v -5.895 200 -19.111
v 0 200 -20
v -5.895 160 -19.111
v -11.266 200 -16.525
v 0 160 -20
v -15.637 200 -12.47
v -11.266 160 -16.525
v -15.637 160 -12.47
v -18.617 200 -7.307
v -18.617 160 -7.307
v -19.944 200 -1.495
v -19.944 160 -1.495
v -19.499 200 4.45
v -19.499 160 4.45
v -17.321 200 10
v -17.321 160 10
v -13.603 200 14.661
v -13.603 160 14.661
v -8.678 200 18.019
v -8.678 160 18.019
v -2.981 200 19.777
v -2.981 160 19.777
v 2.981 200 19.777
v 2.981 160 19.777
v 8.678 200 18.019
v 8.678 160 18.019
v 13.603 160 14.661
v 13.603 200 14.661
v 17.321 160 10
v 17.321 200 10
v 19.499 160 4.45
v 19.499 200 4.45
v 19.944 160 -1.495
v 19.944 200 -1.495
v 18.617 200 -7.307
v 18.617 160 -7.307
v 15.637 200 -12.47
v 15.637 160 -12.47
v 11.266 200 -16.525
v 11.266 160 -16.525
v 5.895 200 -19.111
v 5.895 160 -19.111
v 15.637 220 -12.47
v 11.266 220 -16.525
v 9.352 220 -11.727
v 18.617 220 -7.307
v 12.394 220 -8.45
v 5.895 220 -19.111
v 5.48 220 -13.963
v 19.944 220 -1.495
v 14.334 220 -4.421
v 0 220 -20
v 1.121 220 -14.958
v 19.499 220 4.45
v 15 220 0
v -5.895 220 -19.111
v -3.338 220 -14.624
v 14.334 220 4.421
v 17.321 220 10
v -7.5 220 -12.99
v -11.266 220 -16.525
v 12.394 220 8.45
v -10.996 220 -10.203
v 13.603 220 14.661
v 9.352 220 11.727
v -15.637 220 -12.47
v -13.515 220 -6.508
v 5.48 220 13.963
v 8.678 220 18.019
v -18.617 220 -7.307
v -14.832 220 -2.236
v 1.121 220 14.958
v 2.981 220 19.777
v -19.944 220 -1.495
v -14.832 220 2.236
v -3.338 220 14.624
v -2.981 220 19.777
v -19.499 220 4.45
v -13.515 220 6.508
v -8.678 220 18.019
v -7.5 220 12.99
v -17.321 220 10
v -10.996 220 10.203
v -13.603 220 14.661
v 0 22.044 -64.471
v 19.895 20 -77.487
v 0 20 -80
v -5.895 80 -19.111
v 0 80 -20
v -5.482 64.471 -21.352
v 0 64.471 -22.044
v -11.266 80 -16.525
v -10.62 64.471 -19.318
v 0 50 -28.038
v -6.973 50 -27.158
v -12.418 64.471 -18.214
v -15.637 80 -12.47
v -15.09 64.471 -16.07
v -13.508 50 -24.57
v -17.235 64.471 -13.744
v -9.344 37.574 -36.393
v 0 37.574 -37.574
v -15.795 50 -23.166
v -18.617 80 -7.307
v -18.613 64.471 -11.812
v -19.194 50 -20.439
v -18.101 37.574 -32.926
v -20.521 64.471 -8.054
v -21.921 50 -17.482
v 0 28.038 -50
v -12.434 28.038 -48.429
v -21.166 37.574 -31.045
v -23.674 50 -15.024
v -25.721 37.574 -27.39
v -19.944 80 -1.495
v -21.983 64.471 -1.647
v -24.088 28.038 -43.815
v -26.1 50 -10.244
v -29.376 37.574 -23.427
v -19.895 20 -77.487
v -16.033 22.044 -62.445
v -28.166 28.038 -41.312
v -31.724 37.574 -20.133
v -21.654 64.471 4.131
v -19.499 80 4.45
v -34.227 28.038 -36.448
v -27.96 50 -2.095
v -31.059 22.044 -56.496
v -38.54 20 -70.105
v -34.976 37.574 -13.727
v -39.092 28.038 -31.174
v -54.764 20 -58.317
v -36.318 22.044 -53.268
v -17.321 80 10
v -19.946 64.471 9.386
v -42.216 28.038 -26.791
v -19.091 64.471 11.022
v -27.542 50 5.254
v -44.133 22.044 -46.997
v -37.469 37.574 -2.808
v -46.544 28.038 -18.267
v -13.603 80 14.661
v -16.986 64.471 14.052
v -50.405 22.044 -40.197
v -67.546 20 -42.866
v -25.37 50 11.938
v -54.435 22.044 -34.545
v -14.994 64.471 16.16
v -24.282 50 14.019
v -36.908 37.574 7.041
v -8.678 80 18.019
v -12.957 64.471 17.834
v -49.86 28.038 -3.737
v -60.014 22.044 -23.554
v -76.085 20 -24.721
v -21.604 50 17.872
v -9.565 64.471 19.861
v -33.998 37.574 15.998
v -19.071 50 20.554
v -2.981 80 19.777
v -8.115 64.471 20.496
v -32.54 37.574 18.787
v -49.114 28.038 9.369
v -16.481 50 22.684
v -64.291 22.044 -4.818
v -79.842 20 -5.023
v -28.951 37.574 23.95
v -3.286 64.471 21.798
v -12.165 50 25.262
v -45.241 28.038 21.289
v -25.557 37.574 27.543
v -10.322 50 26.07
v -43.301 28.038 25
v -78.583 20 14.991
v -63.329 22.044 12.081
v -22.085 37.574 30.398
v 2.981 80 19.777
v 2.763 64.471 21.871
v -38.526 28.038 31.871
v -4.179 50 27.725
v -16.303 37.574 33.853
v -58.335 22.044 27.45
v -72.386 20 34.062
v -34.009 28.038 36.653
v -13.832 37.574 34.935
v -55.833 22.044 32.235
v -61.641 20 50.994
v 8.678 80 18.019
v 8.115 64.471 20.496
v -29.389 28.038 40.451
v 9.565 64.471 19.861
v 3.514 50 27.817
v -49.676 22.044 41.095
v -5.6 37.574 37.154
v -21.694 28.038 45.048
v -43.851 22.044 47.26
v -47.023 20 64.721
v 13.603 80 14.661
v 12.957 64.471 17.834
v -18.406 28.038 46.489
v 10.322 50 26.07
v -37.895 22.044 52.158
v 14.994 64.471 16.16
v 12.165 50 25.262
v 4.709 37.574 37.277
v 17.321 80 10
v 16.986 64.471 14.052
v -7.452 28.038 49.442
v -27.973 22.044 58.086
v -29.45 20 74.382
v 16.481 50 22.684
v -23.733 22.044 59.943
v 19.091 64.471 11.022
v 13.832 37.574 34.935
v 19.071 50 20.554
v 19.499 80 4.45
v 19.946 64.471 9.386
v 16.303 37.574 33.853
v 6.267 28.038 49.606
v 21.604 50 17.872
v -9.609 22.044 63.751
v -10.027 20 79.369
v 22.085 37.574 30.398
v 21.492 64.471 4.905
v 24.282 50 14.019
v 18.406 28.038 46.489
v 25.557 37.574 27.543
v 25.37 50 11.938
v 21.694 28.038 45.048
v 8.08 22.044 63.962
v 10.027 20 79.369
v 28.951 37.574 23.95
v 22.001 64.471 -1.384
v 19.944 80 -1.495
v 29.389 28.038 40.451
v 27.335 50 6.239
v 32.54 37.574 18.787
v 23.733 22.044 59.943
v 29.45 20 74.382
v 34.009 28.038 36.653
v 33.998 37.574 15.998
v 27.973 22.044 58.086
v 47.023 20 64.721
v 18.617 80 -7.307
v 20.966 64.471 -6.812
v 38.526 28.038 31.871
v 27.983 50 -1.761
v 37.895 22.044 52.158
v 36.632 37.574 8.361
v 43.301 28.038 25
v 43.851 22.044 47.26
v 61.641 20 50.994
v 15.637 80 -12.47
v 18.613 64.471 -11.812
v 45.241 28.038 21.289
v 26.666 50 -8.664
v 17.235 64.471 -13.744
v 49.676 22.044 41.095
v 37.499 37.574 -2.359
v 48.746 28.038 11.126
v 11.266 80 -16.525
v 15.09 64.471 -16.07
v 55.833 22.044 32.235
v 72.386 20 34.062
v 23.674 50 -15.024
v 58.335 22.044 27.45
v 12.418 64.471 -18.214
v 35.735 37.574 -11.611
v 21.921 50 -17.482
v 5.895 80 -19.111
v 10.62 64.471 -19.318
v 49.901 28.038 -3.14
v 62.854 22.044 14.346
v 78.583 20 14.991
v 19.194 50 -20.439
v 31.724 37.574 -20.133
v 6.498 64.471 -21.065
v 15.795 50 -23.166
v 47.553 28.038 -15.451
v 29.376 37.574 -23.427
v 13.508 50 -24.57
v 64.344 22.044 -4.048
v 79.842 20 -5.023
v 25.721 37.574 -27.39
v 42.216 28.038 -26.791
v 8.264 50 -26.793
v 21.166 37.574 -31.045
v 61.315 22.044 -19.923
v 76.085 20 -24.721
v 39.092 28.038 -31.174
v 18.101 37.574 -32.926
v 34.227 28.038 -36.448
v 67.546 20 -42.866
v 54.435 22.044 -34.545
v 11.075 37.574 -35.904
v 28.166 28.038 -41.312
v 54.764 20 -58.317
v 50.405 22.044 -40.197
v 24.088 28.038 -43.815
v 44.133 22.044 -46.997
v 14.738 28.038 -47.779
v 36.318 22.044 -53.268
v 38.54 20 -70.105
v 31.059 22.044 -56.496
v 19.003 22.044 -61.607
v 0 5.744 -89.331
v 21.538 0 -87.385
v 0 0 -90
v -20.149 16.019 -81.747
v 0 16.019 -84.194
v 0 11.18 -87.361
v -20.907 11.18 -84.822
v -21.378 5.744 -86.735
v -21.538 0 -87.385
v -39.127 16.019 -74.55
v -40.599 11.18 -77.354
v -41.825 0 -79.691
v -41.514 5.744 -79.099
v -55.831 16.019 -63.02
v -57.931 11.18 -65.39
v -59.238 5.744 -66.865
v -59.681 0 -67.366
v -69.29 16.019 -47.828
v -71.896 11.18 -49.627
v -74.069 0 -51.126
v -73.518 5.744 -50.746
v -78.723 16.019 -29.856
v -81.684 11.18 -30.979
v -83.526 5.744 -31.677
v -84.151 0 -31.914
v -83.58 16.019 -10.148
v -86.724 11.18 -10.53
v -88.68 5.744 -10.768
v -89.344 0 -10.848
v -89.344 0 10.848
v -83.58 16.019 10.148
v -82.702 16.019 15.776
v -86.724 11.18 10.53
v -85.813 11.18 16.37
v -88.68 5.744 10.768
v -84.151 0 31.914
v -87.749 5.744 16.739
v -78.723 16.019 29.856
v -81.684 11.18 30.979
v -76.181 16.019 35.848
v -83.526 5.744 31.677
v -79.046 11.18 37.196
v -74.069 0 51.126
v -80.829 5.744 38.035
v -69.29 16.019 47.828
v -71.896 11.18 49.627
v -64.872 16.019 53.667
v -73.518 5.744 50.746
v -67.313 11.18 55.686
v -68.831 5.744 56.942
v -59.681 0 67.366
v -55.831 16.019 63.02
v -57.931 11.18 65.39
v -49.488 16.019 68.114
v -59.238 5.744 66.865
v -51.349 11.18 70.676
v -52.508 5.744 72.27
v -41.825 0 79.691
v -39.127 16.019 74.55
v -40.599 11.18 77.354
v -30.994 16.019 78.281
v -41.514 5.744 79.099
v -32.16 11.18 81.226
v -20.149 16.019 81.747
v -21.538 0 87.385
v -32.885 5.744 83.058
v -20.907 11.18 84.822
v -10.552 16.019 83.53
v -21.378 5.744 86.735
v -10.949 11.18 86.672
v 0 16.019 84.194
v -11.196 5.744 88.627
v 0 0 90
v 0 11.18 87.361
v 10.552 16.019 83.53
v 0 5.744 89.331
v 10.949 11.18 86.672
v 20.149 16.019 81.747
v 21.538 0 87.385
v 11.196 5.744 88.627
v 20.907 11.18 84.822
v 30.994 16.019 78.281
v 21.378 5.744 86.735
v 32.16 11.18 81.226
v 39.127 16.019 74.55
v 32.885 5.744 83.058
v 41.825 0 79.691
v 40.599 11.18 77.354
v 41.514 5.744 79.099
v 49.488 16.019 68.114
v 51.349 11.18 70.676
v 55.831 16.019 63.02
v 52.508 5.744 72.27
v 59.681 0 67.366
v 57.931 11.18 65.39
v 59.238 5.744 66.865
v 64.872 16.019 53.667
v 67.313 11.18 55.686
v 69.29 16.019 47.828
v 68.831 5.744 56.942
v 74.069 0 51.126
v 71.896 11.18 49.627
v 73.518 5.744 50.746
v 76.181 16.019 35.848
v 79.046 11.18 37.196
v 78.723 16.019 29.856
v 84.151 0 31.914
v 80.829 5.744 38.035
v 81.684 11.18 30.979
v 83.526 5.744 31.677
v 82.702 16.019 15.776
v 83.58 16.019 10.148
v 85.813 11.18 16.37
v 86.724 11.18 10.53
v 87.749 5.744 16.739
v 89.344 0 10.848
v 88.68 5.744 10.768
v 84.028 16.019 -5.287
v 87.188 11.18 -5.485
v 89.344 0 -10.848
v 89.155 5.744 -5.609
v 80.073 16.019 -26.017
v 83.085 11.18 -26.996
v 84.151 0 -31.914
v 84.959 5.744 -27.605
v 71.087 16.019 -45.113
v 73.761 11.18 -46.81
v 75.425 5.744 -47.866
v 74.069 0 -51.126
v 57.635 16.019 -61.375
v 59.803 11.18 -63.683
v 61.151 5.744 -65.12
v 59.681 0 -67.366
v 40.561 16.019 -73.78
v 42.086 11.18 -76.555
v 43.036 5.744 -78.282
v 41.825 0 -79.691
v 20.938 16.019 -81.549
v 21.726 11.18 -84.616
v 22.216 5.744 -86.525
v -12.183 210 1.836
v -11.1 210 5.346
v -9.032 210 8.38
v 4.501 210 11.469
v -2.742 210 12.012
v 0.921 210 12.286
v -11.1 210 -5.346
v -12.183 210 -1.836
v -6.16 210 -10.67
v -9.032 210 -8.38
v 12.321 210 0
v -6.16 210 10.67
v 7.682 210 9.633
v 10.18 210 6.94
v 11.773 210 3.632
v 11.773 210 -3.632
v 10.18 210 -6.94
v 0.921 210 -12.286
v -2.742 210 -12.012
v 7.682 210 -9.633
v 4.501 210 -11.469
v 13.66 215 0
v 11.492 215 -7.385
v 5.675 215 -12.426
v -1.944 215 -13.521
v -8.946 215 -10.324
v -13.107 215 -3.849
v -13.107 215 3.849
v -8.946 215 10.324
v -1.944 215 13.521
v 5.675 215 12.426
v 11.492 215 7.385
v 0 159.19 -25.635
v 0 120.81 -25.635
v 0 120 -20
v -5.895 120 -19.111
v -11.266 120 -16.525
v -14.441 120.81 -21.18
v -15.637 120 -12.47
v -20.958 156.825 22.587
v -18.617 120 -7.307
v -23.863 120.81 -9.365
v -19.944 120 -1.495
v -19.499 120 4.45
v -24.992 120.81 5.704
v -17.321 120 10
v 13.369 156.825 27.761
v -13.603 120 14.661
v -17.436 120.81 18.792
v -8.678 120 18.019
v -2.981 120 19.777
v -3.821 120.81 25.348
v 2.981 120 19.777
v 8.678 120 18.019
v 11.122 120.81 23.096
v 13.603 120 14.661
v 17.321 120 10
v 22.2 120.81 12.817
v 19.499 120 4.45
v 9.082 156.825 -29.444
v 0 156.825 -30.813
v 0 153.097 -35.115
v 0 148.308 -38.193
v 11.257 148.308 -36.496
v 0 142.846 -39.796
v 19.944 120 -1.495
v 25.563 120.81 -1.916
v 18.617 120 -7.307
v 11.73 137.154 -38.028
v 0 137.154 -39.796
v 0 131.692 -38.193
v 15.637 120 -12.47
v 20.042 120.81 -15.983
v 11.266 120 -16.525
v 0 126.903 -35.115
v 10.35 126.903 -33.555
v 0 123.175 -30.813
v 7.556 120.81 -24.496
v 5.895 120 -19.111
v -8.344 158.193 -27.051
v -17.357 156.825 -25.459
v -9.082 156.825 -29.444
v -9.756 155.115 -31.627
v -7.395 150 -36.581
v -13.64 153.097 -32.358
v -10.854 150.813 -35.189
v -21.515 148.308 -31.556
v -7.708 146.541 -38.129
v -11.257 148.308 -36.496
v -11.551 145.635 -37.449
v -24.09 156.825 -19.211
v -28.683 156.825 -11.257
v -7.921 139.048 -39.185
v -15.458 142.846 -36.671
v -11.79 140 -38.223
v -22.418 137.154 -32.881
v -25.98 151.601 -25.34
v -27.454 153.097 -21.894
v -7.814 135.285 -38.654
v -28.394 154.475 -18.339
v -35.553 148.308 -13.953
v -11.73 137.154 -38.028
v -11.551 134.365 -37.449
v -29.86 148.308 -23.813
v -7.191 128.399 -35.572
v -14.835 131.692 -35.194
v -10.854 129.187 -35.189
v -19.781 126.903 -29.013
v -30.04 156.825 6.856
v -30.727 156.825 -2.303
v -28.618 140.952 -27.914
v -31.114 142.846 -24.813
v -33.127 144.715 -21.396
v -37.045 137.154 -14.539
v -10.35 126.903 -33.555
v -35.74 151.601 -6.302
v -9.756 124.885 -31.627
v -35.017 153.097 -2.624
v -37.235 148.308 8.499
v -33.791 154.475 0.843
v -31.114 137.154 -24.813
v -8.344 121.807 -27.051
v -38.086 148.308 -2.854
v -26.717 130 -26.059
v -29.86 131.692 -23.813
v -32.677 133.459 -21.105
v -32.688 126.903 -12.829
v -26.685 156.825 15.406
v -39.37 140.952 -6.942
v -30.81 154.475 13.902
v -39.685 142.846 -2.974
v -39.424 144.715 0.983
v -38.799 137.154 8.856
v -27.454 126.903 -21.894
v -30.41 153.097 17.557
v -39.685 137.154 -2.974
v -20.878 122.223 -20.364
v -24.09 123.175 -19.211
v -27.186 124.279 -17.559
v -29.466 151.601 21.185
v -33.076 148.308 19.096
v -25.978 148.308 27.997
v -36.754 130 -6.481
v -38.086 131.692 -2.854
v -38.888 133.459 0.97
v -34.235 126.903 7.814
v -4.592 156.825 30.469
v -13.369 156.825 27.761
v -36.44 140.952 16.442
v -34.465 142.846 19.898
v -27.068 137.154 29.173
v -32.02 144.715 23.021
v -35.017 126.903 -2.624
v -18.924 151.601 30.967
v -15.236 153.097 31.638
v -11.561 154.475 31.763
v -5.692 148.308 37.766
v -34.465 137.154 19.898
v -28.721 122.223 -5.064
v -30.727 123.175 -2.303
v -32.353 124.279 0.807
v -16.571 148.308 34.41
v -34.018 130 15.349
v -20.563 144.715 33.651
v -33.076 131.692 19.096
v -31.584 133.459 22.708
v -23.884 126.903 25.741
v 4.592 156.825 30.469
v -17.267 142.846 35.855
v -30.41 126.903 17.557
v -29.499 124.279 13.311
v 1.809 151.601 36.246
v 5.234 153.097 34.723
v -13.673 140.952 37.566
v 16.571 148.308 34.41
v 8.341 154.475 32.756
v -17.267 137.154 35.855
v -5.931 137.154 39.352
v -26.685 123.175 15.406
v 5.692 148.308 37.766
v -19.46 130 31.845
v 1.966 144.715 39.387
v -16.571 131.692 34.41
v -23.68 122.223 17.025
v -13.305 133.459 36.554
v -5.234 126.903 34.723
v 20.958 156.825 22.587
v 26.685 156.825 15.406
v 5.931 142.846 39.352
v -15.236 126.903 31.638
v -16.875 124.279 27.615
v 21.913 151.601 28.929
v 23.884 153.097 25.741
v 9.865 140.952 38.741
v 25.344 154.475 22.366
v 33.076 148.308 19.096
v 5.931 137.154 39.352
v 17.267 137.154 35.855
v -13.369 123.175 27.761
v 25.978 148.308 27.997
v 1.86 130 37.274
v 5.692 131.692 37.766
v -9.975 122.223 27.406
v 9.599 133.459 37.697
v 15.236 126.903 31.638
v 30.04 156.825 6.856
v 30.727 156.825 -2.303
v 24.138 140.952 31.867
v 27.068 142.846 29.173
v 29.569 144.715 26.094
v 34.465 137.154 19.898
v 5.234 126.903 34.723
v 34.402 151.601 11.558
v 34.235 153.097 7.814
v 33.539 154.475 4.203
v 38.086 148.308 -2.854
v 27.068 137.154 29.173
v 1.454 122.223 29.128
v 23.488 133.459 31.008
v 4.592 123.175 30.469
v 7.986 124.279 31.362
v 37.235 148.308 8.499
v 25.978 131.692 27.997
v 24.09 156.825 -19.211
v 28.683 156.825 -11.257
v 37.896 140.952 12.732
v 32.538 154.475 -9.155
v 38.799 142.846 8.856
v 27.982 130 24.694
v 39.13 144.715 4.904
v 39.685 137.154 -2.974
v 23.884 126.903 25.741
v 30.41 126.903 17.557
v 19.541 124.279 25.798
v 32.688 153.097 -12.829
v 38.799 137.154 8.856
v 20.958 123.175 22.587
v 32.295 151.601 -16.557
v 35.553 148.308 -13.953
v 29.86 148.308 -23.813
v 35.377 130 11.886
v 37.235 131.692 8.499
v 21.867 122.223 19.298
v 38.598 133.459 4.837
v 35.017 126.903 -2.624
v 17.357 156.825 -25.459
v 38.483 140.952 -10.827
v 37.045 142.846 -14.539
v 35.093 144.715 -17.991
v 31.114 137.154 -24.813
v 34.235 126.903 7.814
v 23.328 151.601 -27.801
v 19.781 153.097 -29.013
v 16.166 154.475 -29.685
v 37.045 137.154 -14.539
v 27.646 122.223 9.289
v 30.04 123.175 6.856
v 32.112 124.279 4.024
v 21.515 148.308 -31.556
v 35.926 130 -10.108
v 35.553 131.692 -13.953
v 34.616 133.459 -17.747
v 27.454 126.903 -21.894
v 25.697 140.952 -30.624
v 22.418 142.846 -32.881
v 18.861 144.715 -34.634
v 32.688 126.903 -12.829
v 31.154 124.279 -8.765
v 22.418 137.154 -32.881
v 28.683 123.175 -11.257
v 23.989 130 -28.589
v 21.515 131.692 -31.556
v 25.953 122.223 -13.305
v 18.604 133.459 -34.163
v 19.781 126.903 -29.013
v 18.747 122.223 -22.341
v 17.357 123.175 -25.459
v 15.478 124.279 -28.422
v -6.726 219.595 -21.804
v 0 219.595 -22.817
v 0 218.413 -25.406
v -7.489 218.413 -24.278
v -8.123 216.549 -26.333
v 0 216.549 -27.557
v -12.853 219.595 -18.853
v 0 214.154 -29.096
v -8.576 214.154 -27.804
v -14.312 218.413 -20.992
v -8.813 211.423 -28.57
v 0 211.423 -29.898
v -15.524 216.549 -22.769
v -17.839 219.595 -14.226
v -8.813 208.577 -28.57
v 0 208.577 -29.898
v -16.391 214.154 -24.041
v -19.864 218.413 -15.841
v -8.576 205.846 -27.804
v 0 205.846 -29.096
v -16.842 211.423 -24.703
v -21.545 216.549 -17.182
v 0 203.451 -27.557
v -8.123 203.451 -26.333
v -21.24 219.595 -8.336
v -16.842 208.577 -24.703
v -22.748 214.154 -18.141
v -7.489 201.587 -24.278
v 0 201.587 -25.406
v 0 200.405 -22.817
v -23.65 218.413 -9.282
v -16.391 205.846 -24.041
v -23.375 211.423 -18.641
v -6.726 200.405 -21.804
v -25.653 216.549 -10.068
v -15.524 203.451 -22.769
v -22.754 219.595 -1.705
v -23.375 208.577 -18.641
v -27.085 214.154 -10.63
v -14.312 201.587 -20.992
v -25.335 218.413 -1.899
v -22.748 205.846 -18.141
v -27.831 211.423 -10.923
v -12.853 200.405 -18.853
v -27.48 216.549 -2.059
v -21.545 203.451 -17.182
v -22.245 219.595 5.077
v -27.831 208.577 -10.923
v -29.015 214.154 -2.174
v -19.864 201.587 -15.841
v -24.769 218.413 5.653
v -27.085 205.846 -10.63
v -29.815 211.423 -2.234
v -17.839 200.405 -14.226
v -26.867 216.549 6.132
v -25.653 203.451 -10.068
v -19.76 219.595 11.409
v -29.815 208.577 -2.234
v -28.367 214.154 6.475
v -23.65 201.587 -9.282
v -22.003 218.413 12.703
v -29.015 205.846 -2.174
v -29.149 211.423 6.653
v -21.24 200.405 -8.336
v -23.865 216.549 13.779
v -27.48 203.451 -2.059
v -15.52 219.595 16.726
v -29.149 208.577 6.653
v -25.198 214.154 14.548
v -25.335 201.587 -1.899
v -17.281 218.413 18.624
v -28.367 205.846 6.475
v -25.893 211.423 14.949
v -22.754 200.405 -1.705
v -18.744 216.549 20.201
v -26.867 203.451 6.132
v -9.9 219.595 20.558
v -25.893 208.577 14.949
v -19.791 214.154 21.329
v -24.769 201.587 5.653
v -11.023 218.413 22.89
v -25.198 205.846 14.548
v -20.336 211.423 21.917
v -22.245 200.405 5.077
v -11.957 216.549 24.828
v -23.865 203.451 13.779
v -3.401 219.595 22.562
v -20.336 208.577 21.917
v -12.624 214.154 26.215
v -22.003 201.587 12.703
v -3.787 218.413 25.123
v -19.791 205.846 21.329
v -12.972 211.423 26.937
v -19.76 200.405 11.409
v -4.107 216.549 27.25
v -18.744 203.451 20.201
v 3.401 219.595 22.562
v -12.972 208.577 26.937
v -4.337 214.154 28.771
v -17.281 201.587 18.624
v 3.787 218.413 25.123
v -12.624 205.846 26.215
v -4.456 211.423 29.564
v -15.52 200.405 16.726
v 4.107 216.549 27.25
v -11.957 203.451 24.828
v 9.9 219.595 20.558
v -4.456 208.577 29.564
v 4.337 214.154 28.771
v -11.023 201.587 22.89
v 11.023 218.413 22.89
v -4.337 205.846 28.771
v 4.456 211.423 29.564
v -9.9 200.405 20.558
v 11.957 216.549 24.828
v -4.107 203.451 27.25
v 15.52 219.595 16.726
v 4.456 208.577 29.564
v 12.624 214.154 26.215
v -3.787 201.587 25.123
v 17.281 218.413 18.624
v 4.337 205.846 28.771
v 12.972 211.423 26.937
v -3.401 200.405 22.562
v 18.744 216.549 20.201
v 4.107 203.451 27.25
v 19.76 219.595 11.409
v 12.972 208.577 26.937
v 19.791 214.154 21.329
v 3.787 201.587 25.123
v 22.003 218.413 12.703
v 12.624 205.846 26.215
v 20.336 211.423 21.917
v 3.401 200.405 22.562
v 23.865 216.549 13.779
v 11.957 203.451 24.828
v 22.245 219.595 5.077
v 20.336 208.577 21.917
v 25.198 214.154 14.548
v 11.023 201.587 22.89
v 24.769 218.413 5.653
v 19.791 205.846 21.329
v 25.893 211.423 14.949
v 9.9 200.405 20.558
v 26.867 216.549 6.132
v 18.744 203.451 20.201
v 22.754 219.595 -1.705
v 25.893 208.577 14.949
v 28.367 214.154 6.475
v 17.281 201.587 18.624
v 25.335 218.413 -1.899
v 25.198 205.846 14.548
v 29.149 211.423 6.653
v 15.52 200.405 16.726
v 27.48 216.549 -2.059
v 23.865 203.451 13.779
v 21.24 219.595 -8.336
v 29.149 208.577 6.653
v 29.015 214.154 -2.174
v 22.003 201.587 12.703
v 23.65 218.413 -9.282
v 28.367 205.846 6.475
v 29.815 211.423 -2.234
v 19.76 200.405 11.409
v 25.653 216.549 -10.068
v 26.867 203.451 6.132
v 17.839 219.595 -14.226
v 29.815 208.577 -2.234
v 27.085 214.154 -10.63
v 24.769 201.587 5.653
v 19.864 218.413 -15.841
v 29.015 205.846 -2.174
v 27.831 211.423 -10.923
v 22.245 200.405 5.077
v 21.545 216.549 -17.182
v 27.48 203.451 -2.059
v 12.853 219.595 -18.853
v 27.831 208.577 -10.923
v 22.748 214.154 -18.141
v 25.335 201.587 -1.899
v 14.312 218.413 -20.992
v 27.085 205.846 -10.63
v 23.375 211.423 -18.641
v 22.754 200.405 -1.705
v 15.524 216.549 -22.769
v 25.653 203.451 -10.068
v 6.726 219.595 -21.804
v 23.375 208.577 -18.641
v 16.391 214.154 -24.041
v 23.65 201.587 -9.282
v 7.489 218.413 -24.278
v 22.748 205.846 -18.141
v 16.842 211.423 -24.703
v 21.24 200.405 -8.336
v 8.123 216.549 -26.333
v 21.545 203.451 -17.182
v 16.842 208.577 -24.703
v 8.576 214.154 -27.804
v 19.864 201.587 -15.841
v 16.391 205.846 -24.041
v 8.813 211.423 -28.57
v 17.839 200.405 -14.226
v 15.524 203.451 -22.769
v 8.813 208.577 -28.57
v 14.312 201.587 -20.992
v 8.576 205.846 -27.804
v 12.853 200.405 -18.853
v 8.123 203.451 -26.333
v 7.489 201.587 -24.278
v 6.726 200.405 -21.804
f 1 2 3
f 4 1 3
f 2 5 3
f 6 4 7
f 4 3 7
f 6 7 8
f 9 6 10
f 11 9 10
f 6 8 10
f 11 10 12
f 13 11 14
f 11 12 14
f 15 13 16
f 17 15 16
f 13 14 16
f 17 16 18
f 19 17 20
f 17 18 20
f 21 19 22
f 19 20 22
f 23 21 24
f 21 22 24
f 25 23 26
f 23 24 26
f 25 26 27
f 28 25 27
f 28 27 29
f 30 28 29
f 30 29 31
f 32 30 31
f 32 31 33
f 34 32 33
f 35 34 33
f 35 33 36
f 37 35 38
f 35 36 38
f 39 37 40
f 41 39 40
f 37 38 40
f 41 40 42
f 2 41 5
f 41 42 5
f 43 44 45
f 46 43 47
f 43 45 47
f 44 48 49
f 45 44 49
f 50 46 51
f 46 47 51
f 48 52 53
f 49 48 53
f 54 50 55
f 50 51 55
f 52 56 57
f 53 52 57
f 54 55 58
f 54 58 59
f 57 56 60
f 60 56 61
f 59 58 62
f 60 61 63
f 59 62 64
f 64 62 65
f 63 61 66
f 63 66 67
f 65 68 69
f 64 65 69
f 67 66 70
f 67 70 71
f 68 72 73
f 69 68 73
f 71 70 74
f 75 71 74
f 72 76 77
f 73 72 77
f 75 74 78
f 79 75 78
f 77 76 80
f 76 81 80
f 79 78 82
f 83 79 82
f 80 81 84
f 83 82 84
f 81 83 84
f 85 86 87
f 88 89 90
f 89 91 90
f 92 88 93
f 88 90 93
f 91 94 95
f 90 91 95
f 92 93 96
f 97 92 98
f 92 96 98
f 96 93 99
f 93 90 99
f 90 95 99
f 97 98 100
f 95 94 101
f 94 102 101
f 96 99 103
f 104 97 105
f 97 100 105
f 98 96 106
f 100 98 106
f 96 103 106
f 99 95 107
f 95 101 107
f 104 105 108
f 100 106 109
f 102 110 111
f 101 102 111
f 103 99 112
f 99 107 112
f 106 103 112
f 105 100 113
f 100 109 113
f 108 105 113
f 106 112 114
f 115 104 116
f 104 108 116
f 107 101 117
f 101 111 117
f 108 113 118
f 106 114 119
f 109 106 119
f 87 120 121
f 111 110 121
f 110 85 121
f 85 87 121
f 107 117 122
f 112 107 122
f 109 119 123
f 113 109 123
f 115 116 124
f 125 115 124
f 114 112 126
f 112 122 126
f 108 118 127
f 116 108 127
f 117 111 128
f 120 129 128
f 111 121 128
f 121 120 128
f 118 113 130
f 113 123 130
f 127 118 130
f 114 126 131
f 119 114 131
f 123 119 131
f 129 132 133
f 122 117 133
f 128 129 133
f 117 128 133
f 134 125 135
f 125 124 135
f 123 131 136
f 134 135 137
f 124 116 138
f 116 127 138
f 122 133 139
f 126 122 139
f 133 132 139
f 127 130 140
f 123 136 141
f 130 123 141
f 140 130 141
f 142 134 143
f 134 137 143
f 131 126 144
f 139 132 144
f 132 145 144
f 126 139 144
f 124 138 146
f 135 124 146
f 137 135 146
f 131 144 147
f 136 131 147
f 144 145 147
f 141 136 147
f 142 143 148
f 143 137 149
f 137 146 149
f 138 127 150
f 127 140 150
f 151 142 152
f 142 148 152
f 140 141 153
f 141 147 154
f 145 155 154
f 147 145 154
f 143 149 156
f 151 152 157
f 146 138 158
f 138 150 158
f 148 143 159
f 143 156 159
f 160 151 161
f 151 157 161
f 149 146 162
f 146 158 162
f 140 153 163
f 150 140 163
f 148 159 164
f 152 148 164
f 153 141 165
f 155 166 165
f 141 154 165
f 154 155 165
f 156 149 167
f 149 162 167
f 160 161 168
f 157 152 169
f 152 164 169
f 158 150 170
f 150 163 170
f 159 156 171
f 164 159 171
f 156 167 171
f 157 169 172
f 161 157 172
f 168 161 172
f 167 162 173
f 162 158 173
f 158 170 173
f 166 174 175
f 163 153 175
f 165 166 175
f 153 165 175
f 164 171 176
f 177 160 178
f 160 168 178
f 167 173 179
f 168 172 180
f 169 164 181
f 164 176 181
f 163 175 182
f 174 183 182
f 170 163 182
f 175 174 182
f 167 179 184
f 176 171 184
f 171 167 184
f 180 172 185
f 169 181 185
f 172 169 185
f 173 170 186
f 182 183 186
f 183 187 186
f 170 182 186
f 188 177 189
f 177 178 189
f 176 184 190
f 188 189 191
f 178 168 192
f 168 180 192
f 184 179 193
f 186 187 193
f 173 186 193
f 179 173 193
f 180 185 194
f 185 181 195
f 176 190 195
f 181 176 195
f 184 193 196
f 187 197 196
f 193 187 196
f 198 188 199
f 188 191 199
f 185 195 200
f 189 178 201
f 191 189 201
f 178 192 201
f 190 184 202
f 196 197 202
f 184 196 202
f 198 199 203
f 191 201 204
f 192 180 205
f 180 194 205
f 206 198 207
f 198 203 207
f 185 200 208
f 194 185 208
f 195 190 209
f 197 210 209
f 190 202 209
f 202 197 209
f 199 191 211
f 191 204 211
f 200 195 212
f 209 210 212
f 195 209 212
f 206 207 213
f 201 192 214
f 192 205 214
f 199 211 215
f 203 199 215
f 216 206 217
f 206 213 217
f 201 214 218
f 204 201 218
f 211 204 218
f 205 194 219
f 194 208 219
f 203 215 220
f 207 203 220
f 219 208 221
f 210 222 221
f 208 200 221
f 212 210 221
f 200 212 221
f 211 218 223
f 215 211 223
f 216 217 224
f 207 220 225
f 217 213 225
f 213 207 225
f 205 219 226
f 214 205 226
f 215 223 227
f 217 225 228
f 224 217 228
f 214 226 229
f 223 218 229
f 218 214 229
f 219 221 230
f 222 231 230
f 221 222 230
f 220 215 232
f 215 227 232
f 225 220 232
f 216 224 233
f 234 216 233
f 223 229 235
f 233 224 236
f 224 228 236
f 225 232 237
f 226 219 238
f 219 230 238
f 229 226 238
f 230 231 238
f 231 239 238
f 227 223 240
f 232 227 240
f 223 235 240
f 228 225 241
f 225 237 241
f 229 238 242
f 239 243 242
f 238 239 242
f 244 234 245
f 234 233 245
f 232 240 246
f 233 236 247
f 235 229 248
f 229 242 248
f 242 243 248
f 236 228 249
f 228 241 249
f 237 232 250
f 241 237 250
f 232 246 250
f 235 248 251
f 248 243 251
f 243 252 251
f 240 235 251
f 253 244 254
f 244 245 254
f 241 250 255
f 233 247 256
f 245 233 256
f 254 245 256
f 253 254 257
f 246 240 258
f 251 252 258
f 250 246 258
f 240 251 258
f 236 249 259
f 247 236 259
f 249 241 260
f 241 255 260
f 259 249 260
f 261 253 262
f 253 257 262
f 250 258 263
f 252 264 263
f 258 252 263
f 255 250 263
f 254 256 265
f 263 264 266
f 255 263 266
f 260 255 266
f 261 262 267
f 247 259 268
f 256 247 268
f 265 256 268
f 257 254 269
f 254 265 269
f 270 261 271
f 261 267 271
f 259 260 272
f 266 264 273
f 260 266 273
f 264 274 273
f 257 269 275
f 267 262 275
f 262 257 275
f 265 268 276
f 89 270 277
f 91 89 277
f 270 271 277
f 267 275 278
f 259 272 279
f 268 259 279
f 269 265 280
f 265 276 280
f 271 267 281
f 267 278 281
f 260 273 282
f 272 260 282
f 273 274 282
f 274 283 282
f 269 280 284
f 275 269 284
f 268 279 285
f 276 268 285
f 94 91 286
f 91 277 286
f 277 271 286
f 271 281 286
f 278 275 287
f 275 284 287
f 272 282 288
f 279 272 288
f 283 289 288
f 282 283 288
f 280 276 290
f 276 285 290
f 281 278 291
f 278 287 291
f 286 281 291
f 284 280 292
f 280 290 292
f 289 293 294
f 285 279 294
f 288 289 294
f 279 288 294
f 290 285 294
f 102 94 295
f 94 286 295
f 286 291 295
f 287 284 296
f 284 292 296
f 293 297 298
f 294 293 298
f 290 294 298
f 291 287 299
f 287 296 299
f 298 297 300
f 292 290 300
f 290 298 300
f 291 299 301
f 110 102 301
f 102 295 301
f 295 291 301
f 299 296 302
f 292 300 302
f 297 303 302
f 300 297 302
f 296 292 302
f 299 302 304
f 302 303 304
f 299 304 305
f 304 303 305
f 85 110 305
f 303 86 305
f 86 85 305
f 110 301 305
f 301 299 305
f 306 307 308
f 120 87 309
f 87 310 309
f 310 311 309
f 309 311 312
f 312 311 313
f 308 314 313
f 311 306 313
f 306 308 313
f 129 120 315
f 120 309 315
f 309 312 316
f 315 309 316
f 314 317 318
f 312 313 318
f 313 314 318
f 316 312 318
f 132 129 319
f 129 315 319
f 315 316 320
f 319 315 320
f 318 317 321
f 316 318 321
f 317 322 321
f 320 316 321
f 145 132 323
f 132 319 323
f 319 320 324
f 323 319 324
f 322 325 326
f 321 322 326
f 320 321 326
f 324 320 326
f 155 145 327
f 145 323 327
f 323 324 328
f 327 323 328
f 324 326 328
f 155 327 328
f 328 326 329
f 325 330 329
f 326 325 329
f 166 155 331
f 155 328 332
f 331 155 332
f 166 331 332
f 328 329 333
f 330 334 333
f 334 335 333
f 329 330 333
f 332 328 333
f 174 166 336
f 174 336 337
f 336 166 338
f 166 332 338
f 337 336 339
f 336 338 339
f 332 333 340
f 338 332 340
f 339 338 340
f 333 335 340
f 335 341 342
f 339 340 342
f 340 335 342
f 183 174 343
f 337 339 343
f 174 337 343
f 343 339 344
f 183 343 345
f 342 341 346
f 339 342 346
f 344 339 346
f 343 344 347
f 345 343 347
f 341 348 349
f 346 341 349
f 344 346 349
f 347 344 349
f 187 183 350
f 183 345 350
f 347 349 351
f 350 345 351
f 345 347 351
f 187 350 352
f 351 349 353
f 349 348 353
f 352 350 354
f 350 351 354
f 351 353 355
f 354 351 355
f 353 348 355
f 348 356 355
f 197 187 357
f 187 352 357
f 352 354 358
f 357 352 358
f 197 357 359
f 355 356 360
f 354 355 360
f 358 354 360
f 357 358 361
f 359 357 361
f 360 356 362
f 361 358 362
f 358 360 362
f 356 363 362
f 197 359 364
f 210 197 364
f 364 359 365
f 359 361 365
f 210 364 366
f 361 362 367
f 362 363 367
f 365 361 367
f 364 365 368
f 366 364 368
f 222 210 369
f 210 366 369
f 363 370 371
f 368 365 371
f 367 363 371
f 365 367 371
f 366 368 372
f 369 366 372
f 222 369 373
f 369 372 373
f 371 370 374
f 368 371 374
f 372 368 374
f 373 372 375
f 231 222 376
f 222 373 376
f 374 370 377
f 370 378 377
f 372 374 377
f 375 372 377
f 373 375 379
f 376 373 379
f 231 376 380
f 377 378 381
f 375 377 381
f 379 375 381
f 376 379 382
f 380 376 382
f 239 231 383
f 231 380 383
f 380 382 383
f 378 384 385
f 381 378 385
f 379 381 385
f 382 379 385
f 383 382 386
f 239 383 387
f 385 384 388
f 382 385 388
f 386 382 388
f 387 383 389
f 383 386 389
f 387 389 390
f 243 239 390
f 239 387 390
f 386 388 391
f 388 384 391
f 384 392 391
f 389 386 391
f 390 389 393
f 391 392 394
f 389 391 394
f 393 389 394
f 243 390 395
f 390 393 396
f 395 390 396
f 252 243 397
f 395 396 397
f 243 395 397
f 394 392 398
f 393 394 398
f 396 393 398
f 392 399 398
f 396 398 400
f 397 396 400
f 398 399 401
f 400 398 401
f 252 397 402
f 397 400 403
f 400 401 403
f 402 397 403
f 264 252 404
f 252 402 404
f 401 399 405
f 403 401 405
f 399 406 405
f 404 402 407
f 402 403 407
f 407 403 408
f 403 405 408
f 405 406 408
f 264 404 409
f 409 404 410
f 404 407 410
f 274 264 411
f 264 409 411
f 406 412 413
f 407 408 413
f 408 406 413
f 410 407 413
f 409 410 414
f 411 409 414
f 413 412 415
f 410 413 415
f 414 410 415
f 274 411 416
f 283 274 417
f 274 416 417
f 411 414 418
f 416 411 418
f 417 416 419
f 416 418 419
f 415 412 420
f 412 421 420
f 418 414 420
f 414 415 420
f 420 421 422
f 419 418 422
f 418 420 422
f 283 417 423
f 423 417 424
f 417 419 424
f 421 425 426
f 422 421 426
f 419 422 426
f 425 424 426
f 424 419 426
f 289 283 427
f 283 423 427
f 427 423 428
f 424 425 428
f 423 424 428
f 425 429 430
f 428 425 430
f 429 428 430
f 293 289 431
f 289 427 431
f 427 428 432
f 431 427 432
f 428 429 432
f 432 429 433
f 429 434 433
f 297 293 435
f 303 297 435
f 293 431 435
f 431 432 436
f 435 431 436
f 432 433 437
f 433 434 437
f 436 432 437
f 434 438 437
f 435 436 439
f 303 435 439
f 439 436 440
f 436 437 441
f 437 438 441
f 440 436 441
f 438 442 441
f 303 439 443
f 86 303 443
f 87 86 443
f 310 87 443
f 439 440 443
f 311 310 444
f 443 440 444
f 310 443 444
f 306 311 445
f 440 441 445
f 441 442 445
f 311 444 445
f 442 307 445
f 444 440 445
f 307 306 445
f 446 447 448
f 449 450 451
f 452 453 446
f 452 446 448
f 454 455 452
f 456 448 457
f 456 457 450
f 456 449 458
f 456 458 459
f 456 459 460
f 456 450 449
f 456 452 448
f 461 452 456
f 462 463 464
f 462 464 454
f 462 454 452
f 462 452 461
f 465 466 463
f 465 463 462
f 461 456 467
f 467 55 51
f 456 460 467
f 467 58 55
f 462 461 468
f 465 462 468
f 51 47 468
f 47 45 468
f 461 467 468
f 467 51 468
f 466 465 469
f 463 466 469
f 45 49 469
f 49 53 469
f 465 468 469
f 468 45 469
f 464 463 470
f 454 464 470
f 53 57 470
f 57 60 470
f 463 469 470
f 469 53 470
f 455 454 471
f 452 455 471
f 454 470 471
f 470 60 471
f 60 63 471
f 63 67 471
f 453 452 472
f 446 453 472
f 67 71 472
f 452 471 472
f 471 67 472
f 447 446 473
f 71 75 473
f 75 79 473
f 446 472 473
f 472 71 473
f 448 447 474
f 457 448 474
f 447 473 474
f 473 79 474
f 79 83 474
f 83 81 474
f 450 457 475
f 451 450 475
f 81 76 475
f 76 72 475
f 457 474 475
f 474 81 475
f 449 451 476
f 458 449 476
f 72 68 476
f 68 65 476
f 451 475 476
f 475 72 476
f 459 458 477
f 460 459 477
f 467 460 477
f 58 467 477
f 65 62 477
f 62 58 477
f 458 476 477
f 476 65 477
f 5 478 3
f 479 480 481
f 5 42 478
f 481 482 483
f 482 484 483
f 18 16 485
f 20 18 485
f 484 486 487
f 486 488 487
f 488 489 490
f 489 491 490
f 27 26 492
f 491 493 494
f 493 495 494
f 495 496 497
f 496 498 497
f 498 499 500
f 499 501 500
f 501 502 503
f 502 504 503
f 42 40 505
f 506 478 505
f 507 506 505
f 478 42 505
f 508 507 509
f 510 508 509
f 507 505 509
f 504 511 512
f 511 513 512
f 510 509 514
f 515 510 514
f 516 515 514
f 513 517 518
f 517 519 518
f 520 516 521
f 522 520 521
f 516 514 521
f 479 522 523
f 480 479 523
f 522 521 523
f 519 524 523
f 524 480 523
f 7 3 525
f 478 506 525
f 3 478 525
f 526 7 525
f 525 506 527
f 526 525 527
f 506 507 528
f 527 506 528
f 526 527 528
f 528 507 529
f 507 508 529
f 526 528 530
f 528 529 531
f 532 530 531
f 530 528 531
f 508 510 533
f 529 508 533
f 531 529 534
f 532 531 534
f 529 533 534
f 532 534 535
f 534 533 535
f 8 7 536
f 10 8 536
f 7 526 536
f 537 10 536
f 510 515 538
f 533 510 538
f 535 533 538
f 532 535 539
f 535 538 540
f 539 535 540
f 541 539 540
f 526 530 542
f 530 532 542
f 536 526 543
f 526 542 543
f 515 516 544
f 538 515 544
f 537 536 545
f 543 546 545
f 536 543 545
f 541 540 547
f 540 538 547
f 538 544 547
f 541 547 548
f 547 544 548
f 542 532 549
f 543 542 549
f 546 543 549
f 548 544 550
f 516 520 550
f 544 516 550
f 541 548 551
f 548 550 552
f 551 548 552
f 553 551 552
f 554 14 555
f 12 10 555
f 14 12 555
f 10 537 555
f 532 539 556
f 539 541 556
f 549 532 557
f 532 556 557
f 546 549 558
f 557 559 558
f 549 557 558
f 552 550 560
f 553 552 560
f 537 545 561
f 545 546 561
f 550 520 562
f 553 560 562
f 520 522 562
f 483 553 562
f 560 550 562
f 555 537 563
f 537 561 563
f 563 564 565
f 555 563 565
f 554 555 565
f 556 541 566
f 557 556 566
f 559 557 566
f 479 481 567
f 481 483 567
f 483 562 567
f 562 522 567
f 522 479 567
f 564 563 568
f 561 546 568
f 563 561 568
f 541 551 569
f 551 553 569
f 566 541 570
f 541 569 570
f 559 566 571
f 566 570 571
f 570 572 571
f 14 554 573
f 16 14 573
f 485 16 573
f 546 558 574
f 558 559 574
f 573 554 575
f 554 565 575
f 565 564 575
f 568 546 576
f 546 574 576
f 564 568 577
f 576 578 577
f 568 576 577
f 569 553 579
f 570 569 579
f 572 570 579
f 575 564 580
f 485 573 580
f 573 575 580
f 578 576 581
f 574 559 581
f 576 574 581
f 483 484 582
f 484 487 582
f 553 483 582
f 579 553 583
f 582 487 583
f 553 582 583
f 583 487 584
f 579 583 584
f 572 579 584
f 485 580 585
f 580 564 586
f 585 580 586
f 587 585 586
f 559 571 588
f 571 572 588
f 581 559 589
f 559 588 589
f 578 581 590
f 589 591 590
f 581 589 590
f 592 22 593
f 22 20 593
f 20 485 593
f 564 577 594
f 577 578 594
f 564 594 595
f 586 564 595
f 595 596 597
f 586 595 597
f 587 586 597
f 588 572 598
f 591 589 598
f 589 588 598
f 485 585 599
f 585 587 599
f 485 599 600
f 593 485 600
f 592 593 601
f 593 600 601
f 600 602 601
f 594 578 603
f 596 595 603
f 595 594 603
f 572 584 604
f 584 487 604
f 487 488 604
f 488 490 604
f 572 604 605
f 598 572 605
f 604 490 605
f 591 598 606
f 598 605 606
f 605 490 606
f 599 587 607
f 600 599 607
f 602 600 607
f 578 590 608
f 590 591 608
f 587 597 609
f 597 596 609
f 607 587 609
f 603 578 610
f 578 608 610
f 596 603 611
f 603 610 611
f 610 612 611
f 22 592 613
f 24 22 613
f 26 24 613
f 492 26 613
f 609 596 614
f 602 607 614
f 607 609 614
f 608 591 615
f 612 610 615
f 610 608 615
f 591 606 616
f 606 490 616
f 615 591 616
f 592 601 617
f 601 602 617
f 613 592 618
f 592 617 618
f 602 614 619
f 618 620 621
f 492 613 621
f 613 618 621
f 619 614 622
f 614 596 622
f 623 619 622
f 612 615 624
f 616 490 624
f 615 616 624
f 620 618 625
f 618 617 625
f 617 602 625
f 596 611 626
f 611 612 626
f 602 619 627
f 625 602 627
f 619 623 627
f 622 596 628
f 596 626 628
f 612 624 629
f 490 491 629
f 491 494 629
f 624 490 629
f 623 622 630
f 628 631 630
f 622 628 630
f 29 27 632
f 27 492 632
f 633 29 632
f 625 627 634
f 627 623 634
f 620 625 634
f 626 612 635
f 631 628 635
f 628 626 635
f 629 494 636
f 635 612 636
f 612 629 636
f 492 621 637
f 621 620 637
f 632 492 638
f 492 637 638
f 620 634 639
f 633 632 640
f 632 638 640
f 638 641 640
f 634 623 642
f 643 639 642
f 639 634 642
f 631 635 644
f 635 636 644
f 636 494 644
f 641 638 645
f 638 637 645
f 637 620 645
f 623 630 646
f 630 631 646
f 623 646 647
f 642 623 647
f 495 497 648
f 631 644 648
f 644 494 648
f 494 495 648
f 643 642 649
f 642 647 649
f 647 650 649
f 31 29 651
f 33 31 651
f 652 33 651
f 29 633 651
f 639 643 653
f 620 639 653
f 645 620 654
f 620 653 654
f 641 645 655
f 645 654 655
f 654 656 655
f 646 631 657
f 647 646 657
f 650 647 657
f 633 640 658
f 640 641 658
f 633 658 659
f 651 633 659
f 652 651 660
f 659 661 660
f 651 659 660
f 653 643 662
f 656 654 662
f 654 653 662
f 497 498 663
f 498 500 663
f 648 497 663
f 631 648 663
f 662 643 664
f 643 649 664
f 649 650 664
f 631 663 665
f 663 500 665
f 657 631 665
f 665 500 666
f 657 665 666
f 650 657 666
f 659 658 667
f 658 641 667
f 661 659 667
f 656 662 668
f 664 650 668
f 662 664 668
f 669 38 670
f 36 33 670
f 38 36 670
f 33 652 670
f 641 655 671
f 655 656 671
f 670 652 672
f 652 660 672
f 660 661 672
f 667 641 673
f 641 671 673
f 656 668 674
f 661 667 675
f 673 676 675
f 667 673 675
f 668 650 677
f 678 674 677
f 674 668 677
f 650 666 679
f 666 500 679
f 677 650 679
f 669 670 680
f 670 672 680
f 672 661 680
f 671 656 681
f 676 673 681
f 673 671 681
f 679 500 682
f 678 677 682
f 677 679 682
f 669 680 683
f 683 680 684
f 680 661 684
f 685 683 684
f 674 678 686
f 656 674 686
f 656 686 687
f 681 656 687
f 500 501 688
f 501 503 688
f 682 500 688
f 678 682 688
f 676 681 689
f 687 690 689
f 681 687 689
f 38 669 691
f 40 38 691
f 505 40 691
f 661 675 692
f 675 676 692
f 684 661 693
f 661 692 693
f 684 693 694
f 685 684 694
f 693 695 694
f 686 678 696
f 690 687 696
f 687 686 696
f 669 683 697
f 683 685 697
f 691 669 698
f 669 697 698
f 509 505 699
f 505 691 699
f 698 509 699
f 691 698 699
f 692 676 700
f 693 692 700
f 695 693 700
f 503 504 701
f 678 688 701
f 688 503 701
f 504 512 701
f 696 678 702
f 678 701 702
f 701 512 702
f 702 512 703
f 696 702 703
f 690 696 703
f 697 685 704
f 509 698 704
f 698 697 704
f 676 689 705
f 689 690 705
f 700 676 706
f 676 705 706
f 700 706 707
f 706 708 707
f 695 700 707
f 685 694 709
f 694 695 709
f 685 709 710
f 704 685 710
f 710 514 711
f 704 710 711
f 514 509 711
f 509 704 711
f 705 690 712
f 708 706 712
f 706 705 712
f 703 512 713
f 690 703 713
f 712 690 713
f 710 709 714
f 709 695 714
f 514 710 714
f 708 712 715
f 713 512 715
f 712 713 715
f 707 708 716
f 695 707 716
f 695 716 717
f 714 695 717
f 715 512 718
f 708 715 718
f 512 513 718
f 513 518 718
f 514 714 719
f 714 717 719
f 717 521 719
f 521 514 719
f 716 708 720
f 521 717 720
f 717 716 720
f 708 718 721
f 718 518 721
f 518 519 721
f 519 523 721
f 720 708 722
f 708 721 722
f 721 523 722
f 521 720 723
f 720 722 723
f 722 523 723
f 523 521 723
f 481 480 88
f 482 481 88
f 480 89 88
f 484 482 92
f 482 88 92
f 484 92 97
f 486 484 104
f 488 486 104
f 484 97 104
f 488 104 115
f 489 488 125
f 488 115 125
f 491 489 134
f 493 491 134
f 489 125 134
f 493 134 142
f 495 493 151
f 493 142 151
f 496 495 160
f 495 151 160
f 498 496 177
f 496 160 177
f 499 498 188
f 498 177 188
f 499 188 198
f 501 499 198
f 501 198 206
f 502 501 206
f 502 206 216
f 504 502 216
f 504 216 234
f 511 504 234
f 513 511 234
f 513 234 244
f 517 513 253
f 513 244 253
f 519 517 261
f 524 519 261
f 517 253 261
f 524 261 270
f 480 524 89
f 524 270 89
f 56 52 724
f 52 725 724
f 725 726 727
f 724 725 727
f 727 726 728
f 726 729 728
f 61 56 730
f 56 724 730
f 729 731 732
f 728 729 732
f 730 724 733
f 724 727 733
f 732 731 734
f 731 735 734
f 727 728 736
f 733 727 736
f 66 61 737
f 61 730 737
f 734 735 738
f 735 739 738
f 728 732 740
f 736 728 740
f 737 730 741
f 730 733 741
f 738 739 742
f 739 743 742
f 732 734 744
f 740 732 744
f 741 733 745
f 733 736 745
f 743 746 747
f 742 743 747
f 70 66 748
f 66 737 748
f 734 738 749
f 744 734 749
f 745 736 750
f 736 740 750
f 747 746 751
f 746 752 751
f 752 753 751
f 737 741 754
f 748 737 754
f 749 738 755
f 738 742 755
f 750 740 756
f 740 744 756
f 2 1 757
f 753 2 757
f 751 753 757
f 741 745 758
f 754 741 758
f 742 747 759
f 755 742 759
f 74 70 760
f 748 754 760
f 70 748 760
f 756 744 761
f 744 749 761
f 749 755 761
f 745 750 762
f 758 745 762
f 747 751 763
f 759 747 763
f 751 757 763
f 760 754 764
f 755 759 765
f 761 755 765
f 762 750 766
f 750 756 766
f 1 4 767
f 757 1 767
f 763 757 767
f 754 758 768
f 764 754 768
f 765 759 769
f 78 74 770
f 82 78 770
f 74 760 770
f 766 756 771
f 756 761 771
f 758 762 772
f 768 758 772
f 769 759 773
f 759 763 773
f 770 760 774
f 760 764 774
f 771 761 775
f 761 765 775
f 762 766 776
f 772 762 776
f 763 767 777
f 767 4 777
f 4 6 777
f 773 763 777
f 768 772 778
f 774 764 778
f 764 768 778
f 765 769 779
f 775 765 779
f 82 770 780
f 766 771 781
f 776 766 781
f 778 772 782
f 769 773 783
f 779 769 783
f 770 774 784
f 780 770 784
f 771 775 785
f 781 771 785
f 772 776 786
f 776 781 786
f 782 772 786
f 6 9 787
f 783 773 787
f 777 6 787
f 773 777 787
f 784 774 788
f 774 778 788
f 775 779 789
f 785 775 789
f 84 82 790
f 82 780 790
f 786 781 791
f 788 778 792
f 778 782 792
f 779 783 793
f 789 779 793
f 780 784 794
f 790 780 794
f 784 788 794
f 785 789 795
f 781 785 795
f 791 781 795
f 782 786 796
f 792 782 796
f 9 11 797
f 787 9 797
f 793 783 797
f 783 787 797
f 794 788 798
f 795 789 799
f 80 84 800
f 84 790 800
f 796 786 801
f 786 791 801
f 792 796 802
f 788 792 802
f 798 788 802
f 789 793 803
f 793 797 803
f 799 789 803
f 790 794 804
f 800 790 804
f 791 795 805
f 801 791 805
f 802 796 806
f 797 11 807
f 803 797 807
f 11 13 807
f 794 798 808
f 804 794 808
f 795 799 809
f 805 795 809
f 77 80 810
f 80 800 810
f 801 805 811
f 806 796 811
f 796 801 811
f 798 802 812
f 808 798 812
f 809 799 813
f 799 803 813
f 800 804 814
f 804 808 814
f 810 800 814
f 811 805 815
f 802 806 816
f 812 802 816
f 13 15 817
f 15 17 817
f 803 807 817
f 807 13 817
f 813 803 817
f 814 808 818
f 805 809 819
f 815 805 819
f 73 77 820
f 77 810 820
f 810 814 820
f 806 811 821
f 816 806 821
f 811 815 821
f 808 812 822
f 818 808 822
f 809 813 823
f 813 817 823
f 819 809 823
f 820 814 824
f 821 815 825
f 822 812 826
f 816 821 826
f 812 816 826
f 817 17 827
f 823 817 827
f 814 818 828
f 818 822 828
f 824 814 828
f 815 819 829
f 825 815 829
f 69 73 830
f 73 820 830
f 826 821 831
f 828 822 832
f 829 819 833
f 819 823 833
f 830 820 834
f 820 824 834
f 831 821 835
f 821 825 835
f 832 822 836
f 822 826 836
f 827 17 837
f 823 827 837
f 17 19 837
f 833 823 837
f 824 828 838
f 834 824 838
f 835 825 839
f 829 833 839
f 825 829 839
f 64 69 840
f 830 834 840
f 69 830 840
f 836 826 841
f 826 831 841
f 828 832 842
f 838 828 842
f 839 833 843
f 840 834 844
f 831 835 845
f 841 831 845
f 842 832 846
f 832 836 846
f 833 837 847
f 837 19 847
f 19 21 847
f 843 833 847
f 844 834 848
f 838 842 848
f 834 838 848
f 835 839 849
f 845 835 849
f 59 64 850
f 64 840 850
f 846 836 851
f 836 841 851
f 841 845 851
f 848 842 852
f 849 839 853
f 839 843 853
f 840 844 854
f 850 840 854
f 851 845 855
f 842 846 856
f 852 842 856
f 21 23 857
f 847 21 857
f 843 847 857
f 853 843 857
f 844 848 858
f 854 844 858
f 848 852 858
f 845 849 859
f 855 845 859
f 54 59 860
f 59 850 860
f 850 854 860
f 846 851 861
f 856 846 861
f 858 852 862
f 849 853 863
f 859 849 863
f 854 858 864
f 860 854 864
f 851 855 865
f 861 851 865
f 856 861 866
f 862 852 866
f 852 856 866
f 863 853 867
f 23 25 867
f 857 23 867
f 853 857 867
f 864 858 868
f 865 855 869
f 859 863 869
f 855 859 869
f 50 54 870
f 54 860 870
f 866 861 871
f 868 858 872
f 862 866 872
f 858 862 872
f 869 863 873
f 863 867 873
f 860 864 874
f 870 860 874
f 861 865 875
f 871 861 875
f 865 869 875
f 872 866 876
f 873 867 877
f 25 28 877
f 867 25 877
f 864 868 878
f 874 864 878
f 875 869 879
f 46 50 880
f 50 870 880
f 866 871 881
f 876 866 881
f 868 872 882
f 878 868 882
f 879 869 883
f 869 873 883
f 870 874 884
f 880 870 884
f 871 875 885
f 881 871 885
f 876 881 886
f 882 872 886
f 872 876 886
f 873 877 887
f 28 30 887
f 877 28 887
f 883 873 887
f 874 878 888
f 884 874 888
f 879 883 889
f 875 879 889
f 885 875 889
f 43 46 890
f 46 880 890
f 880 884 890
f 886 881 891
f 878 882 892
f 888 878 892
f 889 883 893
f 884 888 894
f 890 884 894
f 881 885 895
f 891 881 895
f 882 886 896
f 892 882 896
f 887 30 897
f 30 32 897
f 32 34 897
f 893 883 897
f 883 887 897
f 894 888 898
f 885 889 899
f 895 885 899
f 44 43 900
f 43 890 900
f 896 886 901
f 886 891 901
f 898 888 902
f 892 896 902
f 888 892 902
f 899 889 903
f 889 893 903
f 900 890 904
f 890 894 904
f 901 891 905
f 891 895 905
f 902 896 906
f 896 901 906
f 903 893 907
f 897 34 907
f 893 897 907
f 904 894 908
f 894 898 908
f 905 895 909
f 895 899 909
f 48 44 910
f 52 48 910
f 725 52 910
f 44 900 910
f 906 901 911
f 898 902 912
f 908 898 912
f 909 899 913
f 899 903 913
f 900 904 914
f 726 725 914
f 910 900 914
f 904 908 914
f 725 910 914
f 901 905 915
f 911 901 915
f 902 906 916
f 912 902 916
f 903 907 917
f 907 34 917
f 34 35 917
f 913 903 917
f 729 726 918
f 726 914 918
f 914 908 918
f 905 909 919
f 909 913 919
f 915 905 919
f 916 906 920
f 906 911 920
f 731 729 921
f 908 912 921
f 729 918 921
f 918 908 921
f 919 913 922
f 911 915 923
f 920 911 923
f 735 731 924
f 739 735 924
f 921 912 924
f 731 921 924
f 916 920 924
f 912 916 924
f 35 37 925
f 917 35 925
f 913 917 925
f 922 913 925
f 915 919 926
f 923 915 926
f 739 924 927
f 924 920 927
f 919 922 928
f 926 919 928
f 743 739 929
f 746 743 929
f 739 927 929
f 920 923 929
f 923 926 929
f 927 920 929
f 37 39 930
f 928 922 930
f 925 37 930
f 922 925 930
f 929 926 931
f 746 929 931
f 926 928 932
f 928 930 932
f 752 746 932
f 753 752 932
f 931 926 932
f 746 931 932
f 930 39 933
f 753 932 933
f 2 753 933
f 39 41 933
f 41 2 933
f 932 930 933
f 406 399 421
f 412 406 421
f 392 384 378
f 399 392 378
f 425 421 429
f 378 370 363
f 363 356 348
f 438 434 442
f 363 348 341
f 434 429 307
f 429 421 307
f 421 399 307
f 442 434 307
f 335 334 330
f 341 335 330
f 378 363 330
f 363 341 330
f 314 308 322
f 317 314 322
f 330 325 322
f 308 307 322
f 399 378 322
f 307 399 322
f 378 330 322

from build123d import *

# Parameters (mm, degrees)
SKETCH3_R          = 15
CUT_EXTRUDE1_DEPTH = 10
CUT_EXTRUDE1_DRAFT = -15


with BuildPart() as part:
    # Sketch1 → Revolve1 (revolve)
    with BuildSketch(Plane.XY, mode=Mode.PRIVATE) as revolve1_sk:
        with BuildLine():
            Line((0, 0), (0, 220))
            Line((0, 220), (20, 220))
            ThreePointArc((20, 220), (30, 210), (20, 200))
            Line((20, 200), (20, 160))
            ThreePointArc((20, 160), (40, 140), (20, 120))
            Line((20, 120), (20, 80))
            ThreePointArc((20, 80), (37.573593129, 37.573593129), (80, 20))
            ThreePointArc((80, 20), (87.360679775, 11.180339887), (90, 0))
            Line((90, 0), (0, 0))
        make_face()
    revolve(revolve1_sk.sketch.rotate(Axis((0, 0, 0), (0, 1, 0)), 90), axis=Axis((0, 0, 0), (0, 1, 0)))


with BuildPart() as cut_extrude1_tool:
    # Sketch3 → Cut-Extrude1 (with draft: the straight prism first)
    with BuildSketch(Plane(origin=(0, 220, 0), x_dir=(1, 0, 0), z_dir=(0, 1, 0))):
        Circle(SKETCH3_R)
    extrude(amount=-CUT_EXTRUDE1_DEPTH)
    # Cut-Extrude1: the draft: its side faces are tilted about the plane it starts from
    cut_extrude1_sides = [cut_extrude1_tool.faces().sort_by_distance(p)[0] for p in [
        (-15, 215, 0),
    ]]
    draft(cut_extrude1_sides, Plane(origin=(0, 220, 0), x_dir=(1, 0, 0), z_dir=(0, 1, 0)), CUT_EXTRUDE1_DRAFT)


with BuildPart() as part_1:
    add(part.part)

    # Cut-Extrude1: cut by cut_extrude1_tool
    add(cut_extrude1_tool.part, mode=Mode.SUBTRACT)


solid = part_1.part
